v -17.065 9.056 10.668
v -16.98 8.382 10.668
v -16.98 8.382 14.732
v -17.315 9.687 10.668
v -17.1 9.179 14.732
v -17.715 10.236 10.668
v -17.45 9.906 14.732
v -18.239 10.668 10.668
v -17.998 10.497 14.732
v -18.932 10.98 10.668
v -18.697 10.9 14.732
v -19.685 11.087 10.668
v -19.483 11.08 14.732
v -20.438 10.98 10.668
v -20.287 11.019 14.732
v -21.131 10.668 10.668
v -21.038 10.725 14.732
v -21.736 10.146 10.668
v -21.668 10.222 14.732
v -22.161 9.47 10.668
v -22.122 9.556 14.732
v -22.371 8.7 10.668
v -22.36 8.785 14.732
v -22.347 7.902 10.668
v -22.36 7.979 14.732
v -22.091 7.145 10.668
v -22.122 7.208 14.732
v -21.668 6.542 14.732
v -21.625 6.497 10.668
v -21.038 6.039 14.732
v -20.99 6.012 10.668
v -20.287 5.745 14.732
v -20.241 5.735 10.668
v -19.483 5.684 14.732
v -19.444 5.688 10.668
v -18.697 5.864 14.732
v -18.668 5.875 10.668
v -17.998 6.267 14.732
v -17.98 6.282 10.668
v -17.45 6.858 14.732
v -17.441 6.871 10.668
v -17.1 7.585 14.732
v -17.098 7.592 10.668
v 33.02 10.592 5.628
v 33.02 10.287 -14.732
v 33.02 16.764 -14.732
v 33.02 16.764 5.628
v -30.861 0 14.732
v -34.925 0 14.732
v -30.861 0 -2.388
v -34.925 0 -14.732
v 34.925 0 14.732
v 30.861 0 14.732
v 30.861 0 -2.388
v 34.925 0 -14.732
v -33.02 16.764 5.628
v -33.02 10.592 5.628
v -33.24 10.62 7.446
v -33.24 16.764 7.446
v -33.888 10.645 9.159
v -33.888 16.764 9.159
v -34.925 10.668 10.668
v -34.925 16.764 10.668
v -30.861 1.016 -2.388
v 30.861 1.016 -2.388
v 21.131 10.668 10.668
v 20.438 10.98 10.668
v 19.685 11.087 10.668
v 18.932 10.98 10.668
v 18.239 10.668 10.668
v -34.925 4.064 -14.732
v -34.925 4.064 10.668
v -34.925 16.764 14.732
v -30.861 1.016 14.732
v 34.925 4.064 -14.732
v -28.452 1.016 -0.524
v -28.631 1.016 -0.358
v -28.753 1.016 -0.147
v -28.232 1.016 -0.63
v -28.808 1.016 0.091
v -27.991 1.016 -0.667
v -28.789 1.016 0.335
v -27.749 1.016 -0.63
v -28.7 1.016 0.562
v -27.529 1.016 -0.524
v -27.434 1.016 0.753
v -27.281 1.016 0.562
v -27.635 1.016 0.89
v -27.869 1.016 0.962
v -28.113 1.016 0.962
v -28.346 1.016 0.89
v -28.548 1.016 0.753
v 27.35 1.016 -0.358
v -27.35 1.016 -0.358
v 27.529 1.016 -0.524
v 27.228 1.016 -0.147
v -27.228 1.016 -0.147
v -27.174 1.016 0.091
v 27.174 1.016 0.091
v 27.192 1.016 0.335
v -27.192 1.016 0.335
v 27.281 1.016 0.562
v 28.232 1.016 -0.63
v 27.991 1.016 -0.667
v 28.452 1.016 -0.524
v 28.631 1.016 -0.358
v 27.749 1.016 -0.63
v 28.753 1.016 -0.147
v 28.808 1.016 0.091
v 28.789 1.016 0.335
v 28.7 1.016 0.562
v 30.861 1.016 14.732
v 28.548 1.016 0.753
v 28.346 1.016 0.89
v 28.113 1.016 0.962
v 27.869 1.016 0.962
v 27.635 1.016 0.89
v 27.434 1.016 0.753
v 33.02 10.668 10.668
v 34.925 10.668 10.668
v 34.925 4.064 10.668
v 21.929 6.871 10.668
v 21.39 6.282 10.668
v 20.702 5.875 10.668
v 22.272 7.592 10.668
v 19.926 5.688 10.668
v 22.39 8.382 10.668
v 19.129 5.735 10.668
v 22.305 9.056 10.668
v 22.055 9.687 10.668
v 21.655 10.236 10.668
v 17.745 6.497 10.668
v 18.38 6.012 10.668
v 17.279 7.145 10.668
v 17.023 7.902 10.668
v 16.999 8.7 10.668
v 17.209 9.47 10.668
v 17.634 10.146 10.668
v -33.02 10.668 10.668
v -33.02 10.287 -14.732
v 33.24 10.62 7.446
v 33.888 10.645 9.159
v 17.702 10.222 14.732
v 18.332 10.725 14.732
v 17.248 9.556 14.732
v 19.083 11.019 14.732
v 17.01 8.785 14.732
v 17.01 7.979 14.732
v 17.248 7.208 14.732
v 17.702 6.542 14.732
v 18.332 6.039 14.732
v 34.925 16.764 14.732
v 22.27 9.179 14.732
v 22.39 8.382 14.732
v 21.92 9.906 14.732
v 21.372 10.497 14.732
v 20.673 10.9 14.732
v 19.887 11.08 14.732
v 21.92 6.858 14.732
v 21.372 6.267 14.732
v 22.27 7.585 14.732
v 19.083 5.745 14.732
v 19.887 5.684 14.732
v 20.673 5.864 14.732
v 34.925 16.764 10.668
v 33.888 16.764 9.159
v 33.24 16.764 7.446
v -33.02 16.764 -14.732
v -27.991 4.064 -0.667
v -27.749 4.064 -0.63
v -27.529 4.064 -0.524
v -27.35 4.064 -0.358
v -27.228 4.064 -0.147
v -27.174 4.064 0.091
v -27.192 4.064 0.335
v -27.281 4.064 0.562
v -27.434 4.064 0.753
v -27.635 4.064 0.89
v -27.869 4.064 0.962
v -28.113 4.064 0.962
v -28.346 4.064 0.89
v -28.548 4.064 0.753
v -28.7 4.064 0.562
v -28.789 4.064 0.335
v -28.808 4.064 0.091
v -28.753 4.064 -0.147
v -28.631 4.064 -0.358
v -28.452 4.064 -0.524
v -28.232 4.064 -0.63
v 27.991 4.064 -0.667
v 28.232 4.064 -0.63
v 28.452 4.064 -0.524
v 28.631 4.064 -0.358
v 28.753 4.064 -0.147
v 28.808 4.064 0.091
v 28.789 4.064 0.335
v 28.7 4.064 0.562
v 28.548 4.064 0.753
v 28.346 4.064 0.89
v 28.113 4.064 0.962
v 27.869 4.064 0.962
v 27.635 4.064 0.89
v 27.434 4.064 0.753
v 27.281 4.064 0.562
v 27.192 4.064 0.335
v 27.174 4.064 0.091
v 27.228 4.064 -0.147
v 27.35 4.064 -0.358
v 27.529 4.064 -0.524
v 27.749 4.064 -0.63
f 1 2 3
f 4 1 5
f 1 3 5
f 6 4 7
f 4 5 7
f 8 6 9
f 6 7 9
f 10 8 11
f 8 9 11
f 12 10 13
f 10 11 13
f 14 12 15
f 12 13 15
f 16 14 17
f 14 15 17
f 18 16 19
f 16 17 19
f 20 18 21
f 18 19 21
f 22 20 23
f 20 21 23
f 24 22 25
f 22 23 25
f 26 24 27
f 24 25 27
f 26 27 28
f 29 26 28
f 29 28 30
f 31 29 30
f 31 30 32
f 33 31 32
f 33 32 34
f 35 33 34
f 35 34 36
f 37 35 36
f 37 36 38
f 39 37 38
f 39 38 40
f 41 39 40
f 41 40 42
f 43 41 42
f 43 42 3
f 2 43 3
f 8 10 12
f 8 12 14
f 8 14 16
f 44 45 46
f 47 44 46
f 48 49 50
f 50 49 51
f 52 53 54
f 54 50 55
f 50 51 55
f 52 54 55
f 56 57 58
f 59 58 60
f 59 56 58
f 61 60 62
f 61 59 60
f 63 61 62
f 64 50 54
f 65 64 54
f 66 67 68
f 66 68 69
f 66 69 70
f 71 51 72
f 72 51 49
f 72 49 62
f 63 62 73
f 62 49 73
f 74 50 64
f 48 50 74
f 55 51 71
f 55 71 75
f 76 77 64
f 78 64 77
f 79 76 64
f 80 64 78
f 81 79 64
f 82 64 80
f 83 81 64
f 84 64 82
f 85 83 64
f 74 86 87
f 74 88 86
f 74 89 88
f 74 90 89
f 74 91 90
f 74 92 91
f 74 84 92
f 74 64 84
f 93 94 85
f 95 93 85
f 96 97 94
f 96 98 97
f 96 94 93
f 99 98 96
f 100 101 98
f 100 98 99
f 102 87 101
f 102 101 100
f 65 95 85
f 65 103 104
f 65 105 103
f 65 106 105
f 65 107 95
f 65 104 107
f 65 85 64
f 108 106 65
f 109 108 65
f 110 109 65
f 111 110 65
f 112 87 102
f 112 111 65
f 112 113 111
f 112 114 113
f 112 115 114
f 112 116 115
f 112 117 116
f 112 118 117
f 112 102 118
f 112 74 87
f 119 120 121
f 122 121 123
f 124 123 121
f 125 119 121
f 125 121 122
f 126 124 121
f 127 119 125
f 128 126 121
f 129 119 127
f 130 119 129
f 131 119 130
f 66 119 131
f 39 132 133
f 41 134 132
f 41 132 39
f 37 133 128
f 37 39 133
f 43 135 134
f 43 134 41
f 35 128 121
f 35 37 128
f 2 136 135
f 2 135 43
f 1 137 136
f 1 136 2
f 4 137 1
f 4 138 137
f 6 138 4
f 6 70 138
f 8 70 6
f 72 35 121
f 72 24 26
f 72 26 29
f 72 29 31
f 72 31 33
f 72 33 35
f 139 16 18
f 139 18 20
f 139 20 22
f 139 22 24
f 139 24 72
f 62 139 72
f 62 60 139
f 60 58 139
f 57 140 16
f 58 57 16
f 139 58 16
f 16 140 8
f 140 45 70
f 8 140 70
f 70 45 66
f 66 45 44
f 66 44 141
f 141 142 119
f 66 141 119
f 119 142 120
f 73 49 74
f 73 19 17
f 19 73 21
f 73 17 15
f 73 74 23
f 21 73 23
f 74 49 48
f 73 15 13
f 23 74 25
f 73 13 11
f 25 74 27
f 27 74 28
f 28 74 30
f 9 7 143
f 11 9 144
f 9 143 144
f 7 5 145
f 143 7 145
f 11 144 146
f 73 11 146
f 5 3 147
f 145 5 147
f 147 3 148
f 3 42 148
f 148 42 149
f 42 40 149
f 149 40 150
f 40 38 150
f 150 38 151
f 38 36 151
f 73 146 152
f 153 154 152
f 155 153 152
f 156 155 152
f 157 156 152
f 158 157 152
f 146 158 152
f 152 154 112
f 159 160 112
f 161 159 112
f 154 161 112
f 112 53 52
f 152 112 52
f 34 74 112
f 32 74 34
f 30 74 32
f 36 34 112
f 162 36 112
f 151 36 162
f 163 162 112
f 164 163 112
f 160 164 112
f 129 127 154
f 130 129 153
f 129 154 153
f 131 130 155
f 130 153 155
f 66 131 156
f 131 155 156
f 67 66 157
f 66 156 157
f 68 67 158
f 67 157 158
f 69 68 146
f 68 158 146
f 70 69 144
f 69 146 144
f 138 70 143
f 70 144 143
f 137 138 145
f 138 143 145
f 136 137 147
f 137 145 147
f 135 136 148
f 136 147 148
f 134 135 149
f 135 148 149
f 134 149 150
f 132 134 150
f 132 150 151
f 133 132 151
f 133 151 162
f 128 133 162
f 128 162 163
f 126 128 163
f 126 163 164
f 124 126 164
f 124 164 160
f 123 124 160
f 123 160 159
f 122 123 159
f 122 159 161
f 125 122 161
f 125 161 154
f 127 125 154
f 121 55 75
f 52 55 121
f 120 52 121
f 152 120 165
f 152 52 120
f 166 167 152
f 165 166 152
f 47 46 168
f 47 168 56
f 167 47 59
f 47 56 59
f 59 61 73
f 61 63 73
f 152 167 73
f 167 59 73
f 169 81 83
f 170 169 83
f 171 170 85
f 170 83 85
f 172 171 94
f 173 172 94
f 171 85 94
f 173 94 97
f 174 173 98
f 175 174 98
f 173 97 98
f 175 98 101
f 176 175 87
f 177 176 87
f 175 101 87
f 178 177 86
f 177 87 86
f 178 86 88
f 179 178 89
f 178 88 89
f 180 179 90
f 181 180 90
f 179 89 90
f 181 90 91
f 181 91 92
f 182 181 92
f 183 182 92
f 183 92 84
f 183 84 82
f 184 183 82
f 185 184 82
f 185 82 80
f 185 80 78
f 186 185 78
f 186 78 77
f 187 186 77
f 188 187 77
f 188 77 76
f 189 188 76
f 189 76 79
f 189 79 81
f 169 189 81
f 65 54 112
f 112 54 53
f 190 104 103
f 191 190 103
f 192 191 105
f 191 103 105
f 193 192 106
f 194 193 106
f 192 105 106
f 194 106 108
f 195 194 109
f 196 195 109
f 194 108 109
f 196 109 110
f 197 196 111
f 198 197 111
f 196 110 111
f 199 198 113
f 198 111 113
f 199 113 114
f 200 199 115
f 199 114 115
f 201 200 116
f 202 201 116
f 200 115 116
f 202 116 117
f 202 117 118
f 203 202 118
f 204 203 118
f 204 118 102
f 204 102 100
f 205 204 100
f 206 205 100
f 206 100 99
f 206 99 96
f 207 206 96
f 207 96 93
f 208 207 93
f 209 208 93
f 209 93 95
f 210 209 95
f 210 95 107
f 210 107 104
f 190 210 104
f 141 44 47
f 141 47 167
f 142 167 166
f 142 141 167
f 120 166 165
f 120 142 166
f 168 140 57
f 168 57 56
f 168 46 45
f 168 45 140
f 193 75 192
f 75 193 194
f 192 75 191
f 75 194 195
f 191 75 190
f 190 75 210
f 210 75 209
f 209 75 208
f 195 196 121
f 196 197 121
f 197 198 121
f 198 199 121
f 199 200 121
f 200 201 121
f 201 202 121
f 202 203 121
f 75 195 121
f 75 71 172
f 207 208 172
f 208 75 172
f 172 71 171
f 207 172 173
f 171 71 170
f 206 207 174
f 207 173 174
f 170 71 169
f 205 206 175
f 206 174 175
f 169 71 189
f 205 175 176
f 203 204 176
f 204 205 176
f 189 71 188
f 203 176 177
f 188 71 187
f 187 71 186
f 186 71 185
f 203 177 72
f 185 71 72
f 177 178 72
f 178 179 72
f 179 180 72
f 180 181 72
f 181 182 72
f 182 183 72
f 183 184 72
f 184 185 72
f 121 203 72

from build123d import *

# Parameters (mm, degrees)
SKETCH1_W               = 69.85
SKETCH1_H               = 29.464
BOSS_EXTRUDE1_DEPTH     = 16.764
SKETCH2_W               = 25.4
SKETCH2_H               = 6.35
CUT_EXTRUDE1_DEPTH      = 69.85
SKETCH3_W               = 25.4
SKETCH3_H               = 6.35
CUT_EXTRUDE2_DEPTH      = 50.8
SKETCH5_W               = 61.722
SKETCH5_H               = 17.1196
CUT_EXTRUDE3_DEPTH      = 1.016
SKETCH5_3_R             = 0.81915
CUT_EXTRUDE4_DEPTH      = 42.446581825
SKETCH7_W               = 69.85
SKETCH7_H               = 7.62
BOSS_EXTRUDE2_DEPTH     = 25.4
CUT_EXTRUDE9_DEPTH      = 74.328616651
CUT_EXTRUDE9_DEPTH_BACK = 74.328616651
SKETCH13_R              = 2.7051
CUT_EXTRUDE12_DEPTH     = 4.064
SKETCH17_W              = 1.905
SKETCH17_H              = 6.477
CUT_EXTRUDE13_DEPTH     = 25.4
FILLET1_R               = 7.62


with BuildPart() as part:
    # Sketch1 → Boss-Extrude1 (new body)
    with BuildSketch(Plane(origin=(0, 0, 0), x_dir=(1, 0, 0), z_dir=(0, 1, 0))):
        Rectangle(SKETCH1_W, SKETCH1_H)
    extrude(amount=BOSS_EXTRUDE1_DEPTH)

    # Sketch2 → Cut-Extrude1 (cut)
    with BuildSketch(Plane.ZY.offset(34.925)):
        with Locations((-2.032, 7.239)):
            Rectangle(SKETCH2_W, SKETCH2_H)
    extrude(amount=-CUT_EXTRUDE1_DEPTH, mode=Mode.SUBTRACT)

    # Sketch3 → Cut-Extrude2 (cut)
    with BuildSketch(Plane.ZY.offset(34.925)):
        with Locations((-2.032, 13.589)):
            Rectangle(SKETCH3_W, SKETCH3_H)
    cut_extrude2 = extrude(amount=-CUT_EXTRUDE2_DEPTH, mode=Mode.SUBTRACT)

    # Mirror1: Cut-Extrude2 across plane
    add(cut_extrude2.mirror(Plane(origin=(0, 0, 0), x_dir=(0, 0, 1), z_dir=(1, 0, 0))), mode=Mode.SUBTRACT)

    # Sketch5 → Cut-Extrude3 (cut)
    with BuildSketch(Plane.XZ):
        with Locations((0, 6.1722)):
            Rectangle(SKETCH5_W, SKETCH5_H)
    extrude(amount=-CUT_EXTRUDE3_DEPTH, mode=Mode.SUBTRACT)

    # Sketch5<3> → Cut-Extrude4 (cut, through all)
    with BuildSketch(Plane.XZ):
        with Locations(Location((-27.9908, 0.1524, 0), (0, 0, 270))):
            Circle(SKETCH5_3_R)
        with Locations(Location((27.9908, 0.1524, 0), (0, 0, 270))):
            Circle(SKETCH5_3_R)
    extrude(amount=-CUT_EXTRUDE4_DEPTH, mode=Mode.SUBTRACT)

    # Sketch7 → Boss-Extrude2 (add)
    with BuildSketch(Plane(origin=(0, 0, 10.668), x_dir=(-1, 0, 0), z_dir=(0, 0, -1))):
        with Locations((0, 12.954)):
            Rectangle(SKETCH7_W, SKETCH7_H)
    extrude(amount=BOSS_EXTRUDE2_DEPTH)

    # Sketch8 → Cut-Extrude9 (cut, two sides: drawn at the far end of the back side and taken through both)
    with BuildSketch(Plane.ZY.offset(34.925).offset(-CUT_EXTRUDE9_DEPTH_BACK)):
        Polygon((-14.732, 10.287), (10.668, 10.668), (10.668, 9.144), (-14.732, 9.144), align=None)
    extrude(amount=CUT_EXTRUDE9_DEPTH + CUT_EXTRUDE9_DEPTH_BACK, mode=Mode.SUBTRACT)

    # Sketch13 → Cut-Extrude12 (cut)
    with BuildSketch(Plane.XY.offset(14.732)):
        with Locations((-19.685, 8.382)):
            Circle(SKETCH13_R)
        with Locations((19.685, 8.382)):
            Circle(SKETCH13_R)
    extrude(amount=-CUT_EXTRUDE12_DEPTH, mode=Mode.SUBTRACT)

    # Sketch17 → Cut-Extrude13 (cut)
    with BuildSketch(Plane(origin=(0, 0, -14.732), x_dir=(-1, 0, 0), z_dir=(0, 0, -1))):
        with Locations((-33.9725, 13.5255)):
            Rectangle(SKETCH17_W, SKETCH17_H)
        with Locations((33.9725, 13.5255)):
            Rectangle(SKETCH17_W, SKETCH17_H)
    extrude(amount=-CUT_EXTRUDE13_DEPTH, mode=Mode.SUBTRACT)

    # Fillet1
    # the kernel refuses this fillet: 7.62 mm, written as the material it adds along each edge
    with BuildSketch(Plane(origin=(-33.02, 16.764, 10.668), x_dir=(0, 0, -1), z_dir=(0, -1, 0))) as fillet1_piece_1_section:
        with BuildLine():
            CenterArc((5.040156248, -7.62), FILLET1_R, 90, 41.409622109)
            Line((0, -1.905), (-0.100803125, -1.7907))
            ThreePointArc((-0.100803125, -1.7907), (-0.1524, -0.9525), (-0.1524, 0))
            Line((-0.1524, 0), (0, 0.1524))
            Line((0, 0.1524), (5.040156248, 0.1524))
            Line((5.040156248, 0.1524), (5.040156248, 0))
        make_face()
    fillet1_piece_1 = extrude(amount=18.696390619, mode=Mode.PRIVATE)
    fillet1_piece_1 = split(fillet1_piece_1, bisect_by=Plane(origin=(-33.474653721, 10.647897951, 9.327863423), z_dir=(0, 0.9998875189808162, -0.014998312784712252)), keep=Keep.TOP, mode=Mode.PRIVATE)
    add(fillet1_piece_1)
    with BuildSketch(Plane(origin=(33.02, -1.932390619, 10.668), x_dir=(0, 0, -1), z_dir=(0, 1, 0))) as fillet1_piece_2_section:
        with BuildLine():
            CenterArc((5.040156248, -7.62), FILLET1_R, 90, 41.409622109)
            Line((0, -1.905), (-0.100803125, -1.7907))
            ThreePointArc((-0.100803125, -1.7907), (-0.1524, -0.9525), (-0.1524, 0))
            Line((-0.1524, 0), (0, 0.1524))
            Line((0, 0.1524), (5.040156248, 0.1524))
            Line((5.040156248, 0.1524), (5.040156248, 0))
        make_face()
    fillet1_piece_2 = extrude(amount=18.696390619, mode=Mode.PRIVATE)
    fillet1_piece_2 = split(fillet1_piece_2, bisect_by=Plane(origin=(33.474653721, 10.647897951, 9.327863423), z_dir=(0, 0.9998875189808162, -0.014998312784712252)), keep=Keep.TOP, mode=Mode.PRIVATE)
    add(fillet1_piece_2)


solid = part.part
